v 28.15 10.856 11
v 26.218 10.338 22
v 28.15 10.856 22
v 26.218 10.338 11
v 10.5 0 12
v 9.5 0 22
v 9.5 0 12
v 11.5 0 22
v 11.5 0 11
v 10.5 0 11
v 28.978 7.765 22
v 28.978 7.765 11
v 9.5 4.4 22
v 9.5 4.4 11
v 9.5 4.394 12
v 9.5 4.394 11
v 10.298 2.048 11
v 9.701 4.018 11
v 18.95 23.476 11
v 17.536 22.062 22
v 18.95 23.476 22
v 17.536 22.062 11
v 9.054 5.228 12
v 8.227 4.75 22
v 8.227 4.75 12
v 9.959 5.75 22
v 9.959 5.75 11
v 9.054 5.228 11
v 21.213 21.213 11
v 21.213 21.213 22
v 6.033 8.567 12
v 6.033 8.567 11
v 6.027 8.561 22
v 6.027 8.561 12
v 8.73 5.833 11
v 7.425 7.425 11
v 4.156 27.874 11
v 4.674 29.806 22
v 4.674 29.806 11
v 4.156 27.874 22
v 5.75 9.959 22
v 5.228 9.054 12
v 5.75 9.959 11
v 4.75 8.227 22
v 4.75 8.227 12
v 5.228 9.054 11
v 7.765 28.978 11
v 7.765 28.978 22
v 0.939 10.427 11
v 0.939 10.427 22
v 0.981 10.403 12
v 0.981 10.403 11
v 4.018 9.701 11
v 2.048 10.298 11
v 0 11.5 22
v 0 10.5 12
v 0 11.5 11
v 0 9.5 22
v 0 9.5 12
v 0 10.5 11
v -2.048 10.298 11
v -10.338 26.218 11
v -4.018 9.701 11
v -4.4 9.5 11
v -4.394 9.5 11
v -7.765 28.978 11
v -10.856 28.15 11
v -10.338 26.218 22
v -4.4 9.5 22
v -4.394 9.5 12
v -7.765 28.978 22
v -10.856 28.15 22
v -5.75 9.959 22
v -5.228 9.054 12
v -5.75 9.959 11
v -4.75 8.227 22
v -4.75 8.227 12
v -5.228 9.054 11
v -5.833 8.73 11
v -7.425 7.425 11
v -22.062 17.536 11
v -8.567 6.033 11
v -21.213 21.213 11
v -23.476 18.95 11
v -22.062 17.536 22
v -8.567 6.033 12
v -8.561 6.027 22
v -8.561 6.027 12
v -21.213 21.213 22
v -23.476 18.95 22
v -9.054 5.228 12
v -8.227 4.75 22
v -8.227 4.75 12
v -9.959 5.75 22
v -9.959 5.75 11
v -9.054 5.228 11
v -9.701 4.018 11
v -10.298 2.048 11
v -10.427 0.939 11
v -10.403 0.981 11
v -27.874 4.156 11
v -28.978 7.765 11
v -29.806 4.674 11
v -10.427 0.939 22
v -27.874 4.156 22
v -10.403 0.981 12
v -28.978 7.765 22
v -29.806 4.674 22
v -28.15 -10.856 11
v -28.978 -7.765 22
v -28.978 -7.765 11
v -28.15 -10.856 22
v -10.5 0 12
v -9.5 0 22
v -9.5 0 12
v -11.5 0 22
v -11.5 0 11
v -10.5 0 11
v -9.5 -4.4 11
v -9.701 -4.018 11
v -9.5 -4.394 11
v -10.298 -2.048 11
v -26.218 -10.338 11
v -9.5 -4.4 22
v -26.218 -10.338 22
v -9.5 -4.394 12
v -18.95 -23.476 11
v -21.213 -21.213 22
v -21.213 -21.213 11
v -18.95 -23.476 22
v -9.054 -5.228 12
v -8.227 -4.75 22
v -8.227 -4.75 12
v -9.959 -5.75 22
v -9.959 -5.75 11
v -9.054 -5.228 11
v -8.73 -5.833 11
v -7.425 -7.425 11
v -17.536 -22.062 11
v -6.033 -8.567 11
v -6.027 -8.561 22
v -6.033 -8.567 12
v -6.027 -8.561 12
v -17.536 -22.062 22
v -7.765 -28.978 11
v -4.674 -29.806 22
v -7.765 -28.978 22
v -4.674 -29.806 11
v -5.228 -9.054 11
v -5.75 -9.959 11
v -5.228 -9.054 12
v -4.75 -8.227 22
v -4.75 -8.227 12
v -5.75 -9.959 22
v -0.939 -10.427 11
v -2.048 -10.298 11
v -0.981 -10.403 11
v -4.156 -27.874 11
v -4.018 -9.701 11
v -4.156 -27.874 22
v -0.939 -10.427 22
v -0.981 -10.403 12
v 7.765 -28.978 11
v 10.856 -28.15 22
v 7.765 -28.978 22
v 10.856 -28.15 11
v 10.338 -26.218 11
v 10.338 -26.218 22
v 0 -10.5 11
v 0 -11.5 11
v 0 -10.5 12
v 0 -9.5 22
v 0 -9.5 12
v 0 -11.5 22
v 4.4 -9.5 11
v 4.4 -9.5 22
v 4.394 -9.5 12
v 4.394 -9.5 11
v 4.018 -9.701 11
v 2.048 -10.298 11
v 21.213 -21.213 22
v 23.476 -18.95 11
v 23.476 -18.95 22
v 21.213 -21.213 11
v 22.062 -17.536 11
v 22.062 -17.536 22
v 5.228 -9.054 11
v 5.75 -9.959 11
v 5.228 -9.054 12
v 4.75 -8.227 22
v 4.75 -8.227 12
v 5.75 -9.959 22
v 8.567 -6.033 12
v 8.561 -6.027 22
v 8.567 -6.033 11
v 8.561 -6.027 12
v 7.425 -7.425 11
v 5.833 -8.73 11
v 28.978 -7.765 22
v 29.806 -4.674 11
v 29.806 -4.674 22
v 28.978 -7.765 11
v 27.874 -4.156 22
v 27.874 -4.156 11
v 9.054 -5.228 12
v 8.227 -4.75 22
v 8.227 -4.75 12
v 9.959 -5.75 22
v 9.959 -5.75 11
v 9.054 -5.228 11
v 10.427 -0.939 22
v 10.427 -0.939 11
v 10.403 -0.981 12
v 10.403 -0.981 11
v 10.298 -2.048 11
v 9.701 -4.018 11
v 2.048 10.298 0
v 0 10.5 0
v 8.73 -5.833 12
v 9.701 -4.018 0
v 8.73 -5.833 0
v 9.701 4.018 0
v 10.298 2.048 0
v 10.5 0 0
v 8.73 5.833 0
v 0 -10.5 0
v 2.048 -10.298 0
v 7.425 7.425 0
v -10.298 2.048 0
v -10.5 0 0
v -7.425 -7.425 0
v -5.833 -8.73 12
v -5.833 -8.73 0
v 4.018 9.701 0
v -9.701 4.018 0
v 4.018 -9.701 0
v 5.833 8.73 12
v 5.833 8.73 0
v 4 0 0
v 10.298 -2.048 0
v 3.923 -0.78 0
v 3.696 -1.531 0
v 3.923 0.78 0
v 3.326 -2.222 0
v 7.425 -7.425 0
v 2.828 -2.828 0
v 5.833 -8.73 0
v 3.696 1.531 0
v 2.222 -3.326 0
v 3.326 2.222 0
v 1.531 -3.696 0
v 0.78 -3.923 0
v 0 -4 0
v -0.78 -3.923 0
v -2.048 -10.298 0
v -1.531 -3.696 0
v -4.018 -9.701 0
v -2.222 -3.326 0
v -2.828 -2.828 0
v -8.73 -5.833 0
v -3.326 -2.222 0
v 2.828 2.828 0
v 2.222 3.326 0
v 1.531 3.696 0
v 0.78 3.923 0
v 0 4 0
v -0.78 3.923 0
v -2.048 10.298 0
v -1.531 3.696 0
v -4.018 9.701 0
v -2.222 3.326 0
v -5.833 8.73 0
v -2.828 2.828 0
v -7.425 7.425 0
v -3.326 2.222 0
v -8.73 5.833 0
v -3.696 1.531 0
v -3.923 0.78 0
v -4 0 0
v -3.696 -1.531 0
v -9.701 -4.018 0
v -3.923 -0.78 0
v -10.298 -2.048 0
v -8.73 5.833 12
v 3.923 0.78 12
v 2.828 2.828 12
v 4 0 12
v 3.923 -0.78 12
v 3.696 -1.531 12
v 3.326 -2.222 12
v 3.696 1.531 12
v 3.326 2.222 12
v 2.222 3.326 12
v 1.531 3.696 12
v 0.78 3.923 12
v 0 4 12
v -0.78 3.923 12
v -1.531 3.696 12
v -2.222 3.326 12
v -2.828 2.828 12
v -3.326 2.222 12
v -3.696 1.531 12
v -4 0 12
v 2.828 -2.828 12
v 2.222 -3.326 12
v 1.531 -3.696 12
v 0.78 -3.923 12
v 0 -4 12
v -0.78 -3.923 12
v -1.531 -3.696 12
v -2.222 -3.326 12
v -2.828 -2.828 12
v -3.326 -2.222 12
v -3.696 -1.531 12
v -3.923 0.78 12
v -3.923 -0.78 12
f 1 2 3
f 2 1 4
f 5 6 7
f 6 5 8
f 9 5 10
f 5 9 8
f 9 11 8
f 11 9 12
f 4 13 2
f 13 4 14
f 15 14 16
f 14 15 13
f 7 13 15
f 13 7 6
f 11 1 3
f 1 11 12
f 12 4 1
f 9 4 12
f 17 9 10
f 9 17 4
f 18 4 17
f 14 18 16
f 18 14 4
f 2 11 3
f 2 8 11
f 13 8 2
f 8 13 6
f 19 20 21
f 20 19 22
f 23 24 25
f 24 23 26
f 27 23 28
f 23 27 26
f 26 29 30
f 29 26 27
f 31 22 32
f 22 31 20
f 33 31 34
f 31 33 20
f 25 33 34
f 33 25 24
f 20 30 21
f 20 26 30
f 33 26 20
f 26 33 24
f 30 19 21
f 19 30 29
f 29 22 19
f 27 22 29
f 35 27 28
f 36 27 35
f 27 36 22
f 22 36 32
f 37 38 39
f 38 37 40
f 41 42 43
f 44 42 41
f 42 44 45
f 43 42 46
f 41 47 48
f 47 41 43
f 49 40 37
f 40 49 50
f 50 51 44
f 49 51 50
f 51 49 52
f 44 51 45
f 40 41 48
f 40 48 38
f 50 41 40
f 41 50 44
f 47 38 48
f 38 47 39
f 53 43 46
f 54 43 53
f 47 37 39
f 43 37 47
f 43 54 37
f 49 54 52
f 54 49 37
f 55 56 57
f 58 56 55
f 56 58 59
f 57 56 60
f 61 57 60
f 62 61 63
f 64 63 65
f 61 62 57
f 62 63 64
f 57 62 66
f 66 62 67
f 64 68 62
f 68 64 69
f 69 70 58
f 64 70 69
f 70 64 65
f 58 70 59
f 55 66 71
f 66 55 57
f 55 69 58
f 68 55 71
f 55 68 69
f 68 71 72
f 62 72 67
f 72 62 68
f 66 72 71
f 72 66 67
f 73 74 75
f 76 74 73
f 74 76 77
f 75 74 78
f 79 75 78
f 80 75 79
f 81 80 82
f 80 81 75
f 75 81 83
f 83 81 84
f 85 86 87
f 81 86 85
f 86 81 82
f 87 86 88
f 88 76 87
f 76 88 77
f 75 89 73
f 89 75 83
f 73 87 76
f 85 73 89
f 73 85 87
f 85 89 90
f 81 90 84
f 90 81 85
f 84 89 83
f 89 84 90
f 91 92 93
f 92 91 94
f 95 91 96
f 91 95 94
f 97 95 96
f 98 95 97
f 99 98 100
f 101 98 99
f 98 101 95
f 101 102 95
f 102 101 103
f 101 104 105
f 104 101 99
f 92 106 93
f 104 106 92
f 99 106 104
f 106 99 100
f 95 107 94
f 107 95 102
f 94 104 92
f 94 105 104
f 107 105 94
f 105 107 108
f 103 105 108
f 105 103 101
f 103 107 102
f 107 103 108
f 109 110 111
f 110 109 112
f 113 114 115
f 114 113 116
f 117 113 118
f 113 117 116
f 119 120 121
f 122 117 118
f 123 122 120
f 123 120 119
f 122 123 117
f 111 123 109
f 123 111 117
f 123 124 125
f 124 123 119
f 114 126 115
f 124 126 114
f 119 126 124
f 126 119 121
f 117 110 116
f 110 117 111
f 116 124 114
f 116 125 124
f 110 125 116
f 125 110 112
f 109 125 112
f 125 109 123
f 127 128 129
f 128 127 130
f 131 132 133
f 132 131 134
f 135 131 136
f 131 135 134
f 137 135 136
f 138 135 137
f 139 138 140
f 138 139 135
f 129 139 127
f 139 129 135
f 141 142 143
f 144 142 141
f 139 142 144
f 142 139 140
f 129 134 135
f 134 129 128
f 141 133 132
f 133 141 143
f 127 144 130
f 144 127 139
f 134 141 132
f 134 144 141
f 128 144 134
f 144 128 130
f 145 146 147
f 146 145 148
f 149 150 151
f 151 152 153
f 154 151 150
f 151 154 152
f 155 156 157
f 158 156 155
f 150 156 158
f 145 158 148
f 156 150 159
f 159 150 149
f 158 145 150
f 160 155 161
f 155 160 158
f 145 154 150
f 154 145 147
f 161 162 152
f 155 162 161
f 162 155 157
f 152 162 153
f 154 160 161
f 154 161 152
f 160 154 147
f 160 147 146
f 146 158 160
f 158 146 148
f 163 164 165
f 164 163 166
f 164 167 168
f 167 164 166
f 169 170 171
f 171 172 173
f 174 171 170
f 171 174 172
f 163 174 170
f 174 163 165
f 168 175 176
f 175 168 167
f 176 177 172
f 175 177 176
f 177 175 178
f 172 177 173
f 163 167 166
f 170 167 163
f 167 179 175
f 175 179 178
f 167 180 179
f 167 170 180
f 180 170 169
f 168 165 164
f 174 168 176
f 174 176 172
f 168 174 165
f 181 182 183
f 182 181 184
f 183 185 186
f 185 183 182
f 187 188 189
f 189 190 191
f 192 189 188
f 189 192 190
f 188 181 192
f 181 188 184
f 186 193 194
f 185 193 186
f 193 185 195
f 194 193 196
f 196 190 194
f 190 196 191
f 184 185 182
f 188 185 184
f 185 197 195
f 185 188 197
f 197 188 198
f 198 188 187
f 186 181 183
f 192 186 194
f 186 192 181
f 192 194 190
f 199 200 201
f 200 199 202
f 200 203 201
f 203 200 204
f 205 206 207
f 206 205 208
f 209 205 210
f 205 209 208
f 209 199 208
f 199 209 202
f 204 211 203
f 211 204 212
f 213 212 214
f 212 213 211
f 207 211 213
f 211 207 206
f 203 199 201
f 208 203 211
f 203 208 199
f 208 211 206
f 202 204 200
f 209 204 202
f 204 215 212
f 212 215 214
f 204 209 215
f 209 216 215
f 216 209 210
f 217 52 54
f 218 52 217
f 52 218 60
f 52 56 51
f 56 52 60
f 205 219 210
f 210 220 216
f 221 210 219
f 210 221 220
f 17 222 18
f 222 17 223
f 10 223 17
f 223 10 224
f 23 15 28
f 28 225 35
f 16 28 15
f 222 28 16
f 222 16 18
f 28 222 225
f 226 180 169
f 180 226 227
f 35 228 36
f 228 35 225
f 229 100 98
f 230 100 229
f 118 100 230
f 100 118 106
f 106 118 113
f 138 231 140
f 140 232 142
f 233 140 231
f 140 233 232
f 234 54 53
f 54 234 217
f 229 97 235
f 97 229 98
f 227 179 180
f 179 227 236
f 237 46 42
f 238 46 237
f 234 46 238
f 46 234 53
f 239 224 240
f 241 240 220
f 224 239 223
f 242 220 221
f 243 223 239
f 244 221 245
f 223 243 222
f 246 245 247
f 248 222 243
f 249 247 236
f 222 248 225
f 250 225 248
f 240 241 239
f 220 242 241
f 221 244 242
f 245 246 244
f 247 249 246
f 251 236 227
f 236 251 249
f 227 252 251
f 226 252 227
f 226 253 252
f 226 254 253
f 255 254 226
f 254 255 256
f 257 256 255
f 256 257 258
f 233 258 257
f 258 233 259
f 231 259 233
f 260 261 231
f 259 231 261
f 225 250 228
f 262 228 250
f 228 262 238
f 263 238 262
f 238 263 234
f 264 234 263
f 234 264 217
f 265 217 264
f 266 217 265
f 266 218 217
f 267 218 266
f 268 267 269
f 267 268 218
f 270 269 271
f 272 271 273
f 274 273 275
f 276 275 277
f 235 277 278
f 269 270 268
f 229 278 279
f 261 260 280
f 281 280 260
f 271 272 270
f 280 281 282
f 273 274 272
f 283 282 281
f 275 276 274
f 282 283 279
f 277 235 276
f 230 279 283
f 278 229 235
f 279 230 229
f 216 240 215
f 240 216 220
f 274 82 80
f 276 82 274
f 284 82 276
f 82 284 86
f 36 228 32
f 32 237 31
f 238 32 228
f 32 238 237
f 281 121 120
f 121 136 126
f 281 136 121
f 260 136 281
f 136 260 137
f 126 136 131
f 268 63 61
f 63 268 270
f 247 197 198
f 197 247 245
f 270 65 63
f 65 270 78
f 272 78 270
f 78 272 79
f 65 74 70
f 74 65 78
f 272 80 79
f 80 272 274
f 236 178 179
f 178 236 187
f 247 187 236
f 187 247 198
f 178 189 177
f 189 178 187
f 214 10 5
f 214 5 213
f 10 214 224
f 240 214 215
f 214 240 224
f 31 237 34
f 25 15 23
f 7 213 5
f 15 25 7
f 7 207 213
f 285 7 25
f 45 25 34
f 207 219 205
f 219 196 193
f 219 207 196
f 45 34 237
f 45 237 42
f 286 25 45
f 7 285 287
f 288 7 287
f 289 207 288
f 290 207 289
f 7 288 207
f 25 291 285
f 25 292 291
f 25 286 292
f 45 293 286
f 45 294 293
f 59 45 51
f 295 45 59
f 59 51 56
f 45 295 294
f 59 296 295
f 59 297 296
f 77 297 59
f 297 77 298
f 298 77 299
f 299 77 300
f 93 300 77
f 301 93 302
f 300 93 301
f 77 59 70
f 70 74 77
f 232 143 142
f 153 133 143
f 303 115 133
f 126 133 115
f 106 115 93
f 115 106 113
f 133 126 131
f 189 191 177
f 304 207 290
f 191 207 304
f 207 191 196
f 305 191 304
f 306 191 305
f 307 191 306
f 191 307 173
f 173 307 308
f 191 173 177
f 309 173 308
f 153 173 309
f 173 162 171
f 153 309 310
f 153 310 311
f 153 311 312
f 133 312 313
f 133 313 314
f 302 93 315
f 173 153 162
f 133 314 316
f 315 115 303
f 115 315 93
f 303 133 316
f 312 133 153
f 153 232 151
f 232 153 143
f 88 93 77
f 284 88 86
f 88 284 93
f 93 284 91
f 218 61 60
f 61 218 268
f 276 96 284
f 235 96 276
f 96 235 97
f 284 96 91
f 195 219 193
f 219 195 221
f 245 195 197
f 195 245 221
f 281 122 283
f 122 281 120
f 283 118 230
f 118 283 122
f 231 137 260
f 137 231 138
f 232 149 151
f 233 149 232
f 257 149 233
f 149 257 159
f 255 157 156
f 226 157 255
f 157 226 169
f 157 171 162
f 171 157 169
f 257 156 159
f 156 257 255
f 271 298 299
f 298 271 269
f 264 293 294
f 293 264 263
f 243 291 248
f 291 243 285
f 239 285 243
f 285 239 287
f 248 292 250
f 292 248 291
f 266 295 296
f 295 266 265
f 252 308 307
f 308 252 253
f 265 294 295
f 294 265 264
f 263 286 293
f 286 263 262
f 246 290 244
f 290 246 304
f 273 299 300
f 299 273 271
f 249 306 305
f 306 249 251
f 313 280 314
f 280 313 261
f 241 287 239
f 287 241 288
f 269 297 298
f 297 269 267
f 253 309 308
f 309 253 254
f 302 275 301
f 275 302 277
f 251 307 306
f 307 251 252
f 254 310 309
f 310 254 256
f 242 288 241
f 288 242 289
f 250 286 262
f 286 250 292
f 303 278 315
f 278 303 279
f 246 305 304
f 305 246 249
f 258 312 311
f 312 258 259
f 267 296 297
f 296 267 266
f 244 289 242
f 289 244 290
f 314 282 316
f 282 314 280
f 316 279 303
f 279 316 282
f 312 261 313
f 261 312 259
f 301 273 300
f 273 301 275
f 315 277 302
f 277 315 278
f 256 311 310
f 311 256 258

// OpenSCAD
$fn = 32;

// ----------------------------------------------------------------------
// Impeller: 60 mm, 12 blades, 22 mm tall
// ----------------------------------------------------------------------

// --- parameters (mm) ---
center_d = 21;            // hub diameter
center_h = 12;            // hub height
wheel_d = 60;             // outer diameter over the blades
blade_count = 12;         // number of blades
blade_t = 2;              // blade thickness
blade_h = 10;             // blade height
blade_in_r = 9.5;         // blade root radius
blade_out_r = 28;         // blade tip radius
sweep = 15;               // blade sweep, degrees
bore_d = 8;               // shaft bore

module hub() {
  cylinder(h = center_h, d = center_d);
}

module blade() {
  /* blade swept between two boxes: hull of the root and the tip section */
  hull() {
    translate([blade_in_r, 0, center_h - 1])
      cube([blade_t, blade_t * 2.2, blade_h + 1], center = false);
    rotate([0, 0, sweep])
      translate([blade_out_r, 0, center_h - 1])
        cube([blade_t, blade_t * 1.6, blade_h + 1], center = false);
  }
}

module blades() {
  for (i = [0 : blade_count - 1])
    rotate([0, 0, i * 360 / blade_count]) blade();
}

difference() {
  union() {
    hub();
    blades();
  }
  translate([0, 0, -1]) cylinder(h = center_h + blade_h + 0 + 3, d = bore_d);
}
